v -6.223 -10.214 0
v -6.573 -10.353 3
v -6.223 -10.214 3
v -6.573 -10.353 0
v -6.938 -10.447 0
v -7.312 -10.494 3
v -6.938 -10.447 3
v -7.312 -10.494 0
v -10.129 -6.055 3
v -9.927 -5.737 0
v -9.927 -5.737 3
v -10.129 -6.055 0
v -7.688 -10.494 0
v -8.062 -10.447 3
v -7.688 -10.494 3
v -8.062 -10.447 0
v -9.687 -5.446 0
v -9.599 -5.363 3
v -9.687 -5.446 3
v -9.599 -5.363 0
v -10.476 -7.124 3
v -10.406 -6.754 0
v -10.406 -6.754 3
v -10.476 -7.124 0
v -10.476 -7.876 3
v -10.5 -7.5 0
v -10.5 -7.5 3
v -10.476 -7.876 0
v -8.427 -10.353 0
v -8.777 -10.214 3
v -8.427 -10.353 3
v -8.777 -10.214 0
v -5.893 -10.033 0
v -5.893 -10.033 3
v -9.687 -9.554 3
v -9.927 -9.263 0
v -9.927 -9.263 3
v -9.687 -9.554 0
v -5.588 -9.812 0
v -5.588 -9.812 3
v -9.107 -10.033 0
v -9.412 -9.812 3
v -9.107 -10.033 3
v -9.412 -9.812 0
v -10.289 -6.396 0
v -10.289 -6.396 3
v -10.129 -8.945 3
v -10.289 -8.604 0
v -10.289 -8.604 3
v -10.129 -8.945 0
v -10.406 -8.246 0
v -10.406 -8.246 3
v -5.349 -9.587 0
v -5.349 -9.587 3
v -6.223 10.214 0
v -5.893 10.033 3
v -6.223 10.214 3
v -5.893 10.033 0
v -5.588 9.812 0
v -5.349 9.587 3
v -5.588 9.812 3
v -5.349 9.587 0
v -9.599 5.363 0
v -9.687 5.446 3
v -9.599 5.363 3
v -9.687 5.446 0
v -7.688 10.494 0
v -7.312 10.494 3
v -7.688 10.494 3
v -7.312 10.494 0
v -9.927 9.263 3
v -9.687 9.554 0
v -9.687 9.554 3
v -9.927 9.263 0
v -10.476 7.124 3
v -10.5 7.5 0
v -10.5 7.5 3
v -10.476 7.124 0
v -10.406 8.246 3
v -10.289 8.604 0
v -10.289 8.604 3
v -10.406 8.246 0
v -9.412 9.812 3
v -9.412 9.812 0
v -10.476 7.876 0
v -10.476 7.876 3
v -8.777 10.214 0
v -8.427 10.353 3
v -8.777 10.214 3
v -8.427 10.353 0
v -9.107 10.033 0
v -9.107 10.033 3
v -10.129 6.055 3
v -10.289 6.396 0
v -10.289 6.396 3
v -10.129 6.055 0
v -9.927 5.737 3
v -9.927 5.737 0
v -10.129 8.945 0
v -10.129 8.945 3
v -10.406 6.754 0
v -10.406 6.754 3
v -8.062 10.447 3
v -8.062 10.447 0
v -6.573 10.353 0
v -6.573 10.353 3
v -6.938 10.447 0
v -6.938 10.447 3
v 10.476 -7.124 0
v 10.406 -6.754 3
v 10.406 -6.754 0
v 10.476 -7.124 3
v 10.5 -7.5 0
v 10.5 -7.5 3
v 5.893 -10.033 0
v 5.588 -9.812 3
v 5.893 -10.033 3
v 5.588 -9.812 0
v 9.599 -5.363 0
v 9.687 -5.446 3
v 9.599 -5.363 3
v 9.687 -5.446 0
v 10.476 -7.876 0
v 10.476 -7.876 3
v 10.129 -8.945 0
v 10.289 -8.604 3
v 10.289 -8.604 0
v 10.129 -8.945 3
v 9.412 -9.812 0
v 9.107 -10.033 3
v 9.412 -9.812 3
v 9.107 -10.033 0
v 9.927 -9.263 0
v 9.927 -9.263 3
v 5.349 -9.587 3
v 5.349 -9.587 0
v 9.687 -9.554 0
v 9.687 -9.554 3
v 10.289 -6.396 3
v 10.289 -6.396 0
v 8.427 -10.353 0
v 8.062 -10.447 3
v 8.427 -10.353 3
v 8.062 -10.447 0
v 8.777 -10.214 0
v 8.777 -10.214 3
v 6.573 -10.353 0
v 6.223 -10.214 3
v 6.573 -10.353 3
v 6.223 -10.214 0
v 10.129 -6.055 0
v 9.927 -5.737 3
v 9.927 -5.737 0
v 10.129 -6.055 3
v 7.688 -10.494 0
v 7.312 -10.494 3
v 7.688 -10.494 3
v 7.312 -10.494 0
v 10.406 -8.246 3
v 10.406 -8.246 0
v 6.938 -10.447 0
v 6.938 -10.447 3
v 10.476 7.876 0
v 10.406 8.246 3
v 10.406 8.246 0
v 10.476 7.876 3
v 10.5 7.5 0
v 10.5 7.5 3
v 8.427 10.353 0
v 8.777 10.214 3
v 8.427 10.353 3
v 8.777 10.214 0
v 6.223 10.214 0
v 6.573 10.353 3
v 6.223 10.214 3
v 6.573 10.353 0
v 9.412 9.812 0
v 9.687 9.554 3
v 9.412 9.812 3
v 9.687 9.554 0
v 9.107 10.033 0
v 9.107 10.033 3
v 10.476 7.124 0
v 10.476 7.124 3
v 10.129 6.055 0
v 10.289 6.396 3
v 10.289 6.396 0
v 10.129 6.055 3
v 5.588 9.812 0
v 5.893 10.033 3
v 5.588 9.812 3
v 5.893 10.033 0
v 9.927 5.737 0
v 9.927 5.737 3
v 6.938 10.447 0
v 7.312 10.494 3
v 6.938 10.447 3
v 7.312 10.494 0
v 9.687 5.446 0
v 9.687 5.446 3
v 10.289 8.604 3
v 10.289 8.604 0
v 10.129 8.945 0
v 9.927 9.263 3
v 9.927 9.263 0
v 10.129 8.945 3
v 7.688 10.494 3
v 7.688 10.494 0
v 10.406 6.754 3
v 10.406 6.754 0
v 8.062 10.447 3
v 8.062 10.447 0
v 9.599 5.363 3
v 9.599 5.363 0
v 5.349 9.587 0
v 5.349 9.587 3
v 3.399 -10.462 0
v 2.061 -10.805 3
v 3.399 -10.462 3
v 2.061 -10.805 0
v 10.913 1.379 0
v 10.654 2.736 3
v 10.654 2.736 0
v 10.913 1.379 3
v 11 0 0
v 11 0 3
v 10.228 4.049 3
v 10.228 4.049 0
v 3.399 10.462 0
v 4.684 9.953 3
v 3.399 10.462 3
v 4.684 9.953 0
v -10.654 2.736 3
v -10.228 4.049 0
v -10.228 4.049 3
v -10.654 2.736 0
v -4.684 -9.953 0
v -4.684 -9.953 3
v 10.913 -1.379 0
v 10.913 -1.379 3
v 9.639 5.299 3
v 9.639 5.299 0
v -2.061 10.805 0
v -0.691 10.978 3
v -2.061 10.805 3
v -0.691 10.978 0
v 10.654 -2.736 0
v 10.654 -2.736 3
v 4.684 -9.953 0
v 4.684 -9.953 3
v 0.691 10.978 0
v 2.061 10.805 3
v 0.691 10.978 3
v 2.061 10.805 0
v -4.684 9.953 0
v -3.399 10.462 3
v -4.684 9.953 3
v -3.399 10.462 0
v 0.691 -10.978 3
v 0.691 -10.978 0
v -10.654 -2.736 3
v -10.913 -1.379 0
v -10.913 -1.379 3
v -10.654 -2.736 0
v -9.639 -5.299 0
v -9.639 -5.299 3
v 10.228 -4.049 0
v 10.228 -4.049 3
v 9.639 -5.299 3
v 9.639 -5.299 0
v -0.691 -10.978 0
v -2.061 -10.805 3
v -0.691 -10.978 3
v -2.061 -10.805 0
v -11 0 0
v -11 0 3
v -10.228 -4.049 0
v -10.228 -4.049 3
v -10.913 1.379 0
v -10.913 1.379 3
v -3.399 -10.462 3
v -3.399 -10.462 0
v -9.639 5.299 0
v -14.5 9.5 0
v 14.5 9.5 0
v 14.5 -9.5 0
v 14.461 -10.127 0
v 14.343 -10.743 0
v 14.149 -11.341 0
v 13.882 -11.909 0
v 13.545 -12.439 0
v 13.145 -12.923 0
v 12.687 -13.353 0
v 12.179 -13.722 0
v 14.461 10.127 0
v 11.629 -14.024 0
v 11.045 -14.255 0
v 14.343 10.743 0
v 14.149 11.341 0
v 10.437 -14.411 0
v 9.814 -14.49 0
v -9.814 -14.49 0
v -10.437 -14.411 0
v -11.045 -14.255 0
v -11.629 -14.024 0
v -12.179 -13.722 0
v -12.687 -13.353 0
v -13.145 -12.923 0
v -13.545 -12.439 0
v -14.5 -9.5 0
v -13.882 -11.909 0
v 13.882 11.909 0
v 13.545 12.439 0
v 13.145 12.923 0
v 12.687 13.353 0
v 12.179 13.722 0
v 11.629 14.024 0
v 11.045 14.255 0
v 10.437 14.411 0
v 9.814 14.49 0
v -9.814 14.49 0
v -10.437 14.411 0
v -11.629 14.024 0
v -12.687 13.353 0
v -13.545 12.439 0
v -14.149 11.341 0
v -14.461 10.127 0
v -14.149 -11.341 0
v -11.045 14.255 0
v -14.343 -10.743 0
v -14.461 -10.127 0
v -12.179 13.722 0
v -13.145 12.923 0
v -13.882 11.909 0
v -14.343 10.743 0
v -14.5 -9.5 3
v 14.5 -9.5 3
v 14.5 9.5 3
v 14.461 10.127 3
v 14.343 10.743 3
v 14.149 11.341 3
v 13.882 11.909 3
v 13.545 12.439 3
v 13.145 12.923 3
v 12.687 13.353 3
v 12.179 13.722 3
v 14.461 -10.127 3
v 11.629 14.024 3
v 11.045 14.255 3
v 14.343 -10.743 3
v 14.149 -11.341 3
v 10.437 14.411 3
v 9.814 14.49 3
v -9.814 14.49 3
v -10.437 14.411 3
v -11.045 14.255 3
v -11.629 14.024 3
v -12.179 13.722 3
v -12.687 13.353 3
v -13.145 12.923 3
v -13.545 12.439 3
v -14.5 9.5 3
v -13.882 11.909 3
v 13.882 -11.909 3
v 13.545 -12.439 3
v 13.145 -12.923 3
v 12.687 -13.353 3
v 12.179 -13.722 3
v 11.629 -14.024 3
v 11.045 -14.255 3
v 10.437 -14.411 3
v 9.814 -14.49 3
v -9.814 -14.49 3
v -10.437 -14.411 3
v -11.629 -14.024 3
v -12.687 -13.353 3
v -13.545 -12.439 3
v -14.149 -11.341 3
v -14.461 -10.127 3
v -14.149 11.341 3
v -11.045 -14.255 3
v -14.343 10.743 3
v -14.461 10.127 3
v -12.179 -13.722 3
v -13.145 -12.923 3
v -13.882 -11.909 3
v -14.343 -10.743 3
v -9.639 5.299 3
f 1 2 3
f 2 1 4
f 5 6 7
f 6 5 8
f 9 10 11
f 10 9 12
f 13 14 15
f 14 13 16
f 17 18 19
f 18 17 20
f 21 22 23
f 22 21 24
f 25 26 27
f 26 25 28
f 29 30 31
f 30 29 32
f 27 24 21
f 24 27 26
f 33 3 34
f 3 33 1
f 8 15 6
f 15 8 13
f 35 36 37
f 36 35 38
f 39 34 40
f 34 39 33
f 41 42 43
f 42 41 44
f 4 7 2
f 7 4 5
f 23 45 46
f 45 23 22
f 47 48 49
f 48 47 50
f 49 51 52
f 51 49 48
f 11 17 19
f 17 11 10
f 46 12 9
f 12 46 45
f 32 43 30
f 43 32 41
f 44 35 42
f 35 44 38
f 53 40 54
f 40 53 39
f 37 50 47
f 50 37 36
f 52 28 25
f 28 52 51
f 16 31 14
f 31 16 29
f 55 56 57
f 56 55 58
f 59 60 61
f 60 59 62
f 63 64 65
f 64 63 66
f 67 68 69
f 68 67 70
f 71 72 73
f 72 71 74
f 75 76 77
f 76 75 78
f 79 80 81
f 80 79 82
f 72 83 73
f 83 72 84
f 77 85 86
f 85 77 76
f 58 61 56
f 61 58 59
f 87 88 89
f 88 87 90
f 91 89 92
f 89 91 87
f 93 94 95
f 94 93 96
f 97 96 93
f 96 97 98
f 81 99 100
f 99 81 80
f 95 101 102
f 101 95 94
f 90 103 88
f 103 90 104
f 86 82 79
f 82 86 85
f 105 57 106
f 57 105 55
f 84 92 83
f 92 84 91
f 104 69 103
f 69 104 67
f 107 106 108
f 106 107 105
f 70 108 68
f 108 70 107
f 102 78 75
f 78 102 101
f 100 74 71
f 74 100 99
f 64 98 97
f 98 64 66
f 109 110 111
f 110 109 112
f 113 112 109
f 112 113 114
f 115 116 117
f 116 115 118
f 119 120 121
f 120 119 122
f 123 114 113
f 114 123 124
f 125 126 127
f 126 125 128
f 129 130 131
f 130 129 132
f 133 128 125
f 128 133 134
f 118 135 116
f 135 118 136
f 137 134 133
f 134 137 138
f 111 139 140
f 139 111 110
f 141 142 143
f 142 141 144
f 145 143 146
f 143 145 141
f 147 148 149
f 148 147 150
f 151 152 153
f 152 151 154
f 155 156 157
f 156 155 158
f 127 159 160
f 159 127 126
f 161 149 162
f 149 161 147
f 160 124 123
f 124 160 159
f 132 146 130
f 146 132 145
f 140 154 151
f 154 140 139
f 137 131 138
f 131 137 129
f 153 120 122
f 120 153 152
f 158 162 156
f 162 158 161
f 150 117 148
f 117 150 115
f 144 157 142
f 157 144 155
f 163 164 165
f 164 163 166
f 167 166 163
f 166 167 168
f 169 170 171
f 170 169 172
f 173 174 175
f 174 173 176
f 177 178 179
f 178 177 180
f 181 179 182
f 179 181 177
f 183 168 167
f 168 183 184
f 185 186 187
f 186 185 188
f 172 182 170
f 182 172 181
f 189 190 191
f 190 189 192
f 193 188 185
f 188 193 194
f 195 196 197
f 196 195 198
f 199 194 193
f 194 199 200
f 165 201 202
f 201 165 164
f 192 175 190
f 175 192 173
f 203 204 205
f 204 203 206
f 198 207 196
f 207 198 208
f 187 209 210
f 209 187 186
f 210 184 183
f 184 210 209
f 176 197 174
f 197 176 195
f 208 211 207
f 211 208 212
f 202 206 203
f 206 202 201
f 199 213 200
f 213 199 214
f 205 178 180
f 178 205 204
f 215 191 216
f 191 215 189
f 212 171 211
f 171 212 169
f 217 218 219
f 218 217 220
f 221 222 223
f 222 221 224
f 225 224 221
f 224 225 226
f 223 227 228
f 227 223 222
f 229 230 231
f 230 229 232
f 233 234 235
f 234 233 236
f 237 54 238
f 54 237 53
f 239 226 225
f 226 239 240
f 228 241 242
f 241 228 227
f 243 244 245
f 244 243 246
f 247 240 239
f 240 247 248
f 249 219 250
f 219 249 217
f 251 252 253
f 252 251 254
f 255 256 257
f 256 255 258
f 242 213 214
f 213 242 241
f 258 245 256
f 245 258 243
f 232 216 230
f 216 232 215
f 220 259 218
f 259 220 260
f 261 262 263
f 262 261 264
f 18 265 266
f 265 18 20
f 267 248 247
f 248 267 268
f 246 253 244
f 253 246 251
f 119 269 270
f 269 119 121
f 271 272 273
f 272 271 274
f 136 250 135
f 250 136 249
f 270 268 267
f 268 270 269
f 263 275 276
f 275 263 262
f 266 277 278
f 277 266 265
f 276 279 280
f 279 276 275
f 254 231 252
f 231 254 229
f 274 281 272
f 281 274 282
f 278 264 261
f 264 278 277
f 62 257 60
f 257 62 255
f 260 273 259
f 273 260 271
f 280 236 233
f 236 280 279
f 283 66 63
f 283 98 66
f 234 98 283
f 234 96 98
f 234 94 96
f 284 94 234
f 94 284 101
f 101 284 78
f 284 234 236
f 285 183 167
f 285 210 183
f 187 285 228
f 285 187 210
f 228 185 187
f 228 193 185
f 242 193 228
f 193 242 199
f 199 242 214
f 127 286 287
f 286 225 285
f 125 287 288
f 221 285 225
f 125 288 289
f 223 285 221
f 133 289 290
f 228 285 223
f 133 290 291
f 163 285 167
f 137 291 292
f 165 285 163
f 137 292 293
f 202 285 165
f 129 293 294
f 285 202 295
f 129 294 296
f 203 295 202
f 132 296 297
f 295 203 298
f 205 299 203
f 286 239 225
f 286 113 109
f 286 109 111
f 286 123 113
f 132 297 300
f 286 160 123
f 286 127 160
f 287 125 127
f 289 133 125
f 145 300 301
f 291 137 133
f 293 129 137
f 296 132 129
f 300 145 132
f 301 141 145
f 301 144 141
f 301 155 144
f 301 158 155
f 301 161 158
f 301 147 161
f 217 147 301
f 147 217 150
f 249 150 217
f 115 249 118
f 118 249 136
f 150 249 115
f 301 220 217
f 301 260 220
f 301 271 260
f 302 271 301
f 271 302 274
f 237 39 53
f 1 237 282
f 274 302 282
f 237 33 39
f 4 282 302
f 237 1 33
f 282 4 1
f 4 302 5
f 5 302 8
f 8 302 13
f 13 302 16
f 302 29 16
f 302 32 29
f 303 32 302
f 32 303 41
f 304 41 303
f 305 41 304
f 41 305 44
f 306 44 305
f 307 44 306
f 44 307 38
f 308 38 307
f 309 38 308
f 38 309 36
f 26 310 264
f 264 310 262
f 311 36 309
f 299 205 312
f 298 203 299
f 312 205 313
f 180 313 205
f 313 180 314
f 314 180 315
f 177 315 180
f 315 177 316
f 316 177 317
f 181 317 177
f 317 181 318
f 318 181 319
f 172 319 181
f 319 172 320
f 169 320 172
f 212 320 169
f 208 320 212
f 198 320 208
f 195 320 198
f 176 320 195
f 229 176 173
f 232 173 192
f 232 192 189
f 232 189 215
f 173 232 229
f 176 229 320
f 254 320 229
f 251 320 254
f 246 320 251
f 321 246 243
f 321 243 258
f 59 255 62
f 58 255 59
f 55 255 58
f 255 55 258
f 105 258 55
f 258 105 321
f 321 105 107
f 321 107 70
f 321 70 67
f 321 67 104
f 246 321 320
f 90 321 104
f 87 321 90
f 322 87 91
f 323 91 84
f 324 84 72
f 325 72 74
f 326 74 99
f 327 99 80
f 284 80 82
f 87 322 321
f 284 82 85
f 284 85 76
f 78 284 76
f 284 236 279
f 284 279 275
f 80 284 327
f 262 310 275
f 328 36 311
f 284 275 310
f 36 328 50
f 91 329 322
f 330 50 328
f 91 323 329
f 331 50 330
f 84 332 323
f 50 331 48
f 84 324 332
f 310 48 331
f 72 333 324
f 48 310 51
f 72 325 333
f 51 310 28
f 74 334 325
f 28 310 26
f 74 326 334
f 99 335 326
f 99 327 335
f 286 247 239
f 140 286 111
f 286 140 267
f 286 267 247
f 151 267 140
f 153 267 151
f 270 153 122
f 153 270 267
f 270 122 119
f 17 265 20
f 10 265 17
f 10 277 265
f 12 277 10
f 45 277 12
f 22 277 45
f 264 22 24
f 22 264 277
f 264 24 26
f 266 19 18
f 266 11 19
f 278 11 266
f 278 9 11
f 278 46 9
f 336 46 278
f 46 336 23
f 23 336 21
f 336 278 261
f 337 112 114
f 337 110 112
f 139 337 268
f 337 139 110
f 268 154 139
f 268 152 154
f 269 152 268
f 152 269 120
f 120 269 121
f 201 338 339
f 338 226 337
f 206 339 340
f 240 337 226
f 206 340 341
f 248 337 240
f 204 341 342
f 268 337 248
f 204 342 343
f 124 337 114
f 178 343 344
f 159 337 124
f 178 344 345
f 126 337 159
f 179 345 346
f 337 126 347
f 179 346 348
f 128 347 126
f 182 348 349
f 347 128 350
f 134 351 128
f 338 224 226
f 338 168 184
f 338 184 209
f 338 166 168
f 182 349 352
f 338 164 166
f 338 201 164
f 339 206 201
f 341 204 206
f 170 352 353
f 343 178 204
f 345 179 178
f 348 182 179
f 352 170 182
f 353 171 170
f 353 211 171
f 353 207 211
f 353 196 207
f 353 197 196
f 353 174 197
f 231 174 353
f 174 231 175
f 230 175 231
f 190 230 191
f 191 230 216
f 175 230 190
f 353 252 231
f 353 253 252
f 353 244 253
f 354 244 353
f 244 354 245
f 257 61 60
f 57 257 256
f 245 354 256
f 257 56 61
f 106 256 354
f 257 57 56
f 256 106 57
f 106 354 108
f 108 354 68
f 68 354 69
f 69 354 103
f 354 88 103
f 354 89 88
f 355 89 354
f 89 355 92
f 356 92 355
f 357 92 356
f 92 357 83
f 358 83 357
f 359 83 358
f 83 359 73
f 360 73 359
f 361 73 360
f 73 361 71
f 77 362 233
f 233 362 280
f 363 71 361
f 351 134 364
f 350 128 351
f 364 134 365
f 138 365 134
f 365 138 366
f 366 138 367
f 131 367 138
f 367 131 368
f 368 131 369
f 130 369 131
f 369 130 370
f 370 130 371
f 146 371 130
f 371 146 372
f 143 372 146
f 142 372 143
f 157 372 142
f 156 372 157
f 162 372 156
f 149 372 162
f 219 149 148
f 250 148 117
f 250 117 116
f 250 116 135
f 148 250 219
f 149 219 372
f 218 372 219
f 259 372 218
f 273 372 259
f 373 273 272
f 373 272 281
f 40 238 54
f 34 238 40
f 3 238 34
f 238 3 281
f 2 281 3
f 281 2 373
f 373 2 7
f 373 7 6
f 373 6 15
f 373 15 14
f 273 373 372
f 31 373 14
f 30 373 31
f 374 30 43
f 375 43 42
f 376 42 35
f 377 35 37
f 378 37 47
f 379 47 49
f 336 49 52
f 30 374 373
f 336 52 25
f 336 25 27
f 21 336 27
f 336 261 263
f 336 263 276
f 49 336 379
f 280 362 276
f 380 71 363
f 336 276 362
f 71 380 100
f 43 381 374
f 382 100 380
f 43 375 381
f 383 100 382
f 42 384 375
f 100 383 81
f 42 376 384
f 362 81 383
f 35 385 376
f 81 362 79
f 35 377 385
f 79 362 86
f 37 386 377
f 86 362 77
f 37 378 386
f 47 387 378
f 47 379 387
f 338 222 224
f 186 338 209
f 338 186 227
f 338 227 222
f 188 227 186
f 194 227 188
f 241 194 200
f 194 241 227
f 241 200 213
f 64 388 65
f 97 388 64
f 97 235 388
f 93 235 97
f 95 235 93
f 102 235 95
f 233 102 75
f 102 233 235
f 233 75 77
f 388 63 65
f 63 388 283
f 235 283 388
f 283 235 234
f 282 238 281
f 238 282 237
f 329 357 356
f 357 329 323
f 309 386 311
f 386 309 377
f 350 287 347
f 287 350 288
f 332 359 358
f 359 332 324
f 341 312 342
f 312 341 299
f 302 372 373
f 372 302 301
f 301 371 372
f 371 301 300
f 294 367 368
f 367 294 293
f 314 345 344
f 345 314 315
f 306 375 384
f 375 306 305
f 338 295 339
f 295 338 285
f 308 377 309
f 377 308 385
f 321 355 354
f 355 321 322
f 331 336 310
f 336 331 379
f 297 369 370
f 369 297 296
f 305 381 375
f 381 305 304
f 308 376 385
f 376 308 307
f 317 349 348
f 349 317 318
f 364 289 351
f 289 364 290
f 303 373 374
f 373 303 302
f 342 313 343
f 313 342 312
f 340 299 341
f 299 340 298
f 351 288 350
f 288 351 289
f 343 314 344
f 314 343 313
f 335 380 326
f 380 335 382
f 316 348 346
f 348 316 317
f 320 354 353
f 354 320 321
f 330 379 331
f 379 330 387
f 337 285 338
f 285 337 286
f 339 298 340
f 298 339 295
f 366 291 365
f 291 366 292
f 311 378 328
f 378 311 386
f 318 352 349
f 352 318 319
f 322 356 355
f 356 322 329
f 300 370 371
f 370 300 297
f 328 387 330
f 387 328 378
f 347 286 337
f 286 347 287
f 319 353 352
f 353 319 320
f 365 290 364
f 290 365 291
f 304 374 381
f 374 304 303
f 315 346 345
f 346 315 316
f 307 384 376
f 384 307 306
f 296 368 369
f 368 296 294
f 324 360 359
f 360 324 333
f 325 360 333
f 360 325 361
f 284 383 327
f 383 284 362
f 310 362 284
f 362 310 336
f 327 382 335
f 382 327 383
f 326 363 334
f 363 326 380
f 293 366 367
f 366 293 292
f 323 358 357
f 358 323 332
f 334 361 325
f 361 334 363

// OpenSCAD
$fn = 50;


difference() {
	union() {
		hull() {
			translate(v = [-9.5000000000, 9.5000000000, 0]) {
				cylinder(h = 3, r = 5);
			}
			translate(v = [9.5000000000, 9.5000000000, 0]) {
				cylinder(h = 3, r = 5);
			}
			translate(v = [-9.5000000000, -9.5000000000, 0]) {
				cylinder(h = 3, r = 5);
			}
			translate(v = [9.5000000000, -9.5000000000, 0]) {
				cylinder(h = 3, r = 5);
			}
		}
	}
	union() {
		#translate(v = [-7.5000000000, -7.5000000000, -100.0000000000]) {
			cylinder(h = 200, r = 3.0000000000);
		}
		#translate(v = [-7.5000000000, 7.5000000000, -100.0000000000]) {
			cylinder(h = 200, r = 3.0000000000);
		}
		#translate(v = [7.5000000000, -7.5000000000, -100.0000000000]) {
			cylinder(h = 200, r = 3.0000000000);
		}
		#translate(v = [7.5000000000, 7.5000000000, -100.0000000000]) {
			cylinder(h = 200, r = 3.0000000000);
		}
		#cylinder(h = 3, r = 11.0000000000);
	}
}
